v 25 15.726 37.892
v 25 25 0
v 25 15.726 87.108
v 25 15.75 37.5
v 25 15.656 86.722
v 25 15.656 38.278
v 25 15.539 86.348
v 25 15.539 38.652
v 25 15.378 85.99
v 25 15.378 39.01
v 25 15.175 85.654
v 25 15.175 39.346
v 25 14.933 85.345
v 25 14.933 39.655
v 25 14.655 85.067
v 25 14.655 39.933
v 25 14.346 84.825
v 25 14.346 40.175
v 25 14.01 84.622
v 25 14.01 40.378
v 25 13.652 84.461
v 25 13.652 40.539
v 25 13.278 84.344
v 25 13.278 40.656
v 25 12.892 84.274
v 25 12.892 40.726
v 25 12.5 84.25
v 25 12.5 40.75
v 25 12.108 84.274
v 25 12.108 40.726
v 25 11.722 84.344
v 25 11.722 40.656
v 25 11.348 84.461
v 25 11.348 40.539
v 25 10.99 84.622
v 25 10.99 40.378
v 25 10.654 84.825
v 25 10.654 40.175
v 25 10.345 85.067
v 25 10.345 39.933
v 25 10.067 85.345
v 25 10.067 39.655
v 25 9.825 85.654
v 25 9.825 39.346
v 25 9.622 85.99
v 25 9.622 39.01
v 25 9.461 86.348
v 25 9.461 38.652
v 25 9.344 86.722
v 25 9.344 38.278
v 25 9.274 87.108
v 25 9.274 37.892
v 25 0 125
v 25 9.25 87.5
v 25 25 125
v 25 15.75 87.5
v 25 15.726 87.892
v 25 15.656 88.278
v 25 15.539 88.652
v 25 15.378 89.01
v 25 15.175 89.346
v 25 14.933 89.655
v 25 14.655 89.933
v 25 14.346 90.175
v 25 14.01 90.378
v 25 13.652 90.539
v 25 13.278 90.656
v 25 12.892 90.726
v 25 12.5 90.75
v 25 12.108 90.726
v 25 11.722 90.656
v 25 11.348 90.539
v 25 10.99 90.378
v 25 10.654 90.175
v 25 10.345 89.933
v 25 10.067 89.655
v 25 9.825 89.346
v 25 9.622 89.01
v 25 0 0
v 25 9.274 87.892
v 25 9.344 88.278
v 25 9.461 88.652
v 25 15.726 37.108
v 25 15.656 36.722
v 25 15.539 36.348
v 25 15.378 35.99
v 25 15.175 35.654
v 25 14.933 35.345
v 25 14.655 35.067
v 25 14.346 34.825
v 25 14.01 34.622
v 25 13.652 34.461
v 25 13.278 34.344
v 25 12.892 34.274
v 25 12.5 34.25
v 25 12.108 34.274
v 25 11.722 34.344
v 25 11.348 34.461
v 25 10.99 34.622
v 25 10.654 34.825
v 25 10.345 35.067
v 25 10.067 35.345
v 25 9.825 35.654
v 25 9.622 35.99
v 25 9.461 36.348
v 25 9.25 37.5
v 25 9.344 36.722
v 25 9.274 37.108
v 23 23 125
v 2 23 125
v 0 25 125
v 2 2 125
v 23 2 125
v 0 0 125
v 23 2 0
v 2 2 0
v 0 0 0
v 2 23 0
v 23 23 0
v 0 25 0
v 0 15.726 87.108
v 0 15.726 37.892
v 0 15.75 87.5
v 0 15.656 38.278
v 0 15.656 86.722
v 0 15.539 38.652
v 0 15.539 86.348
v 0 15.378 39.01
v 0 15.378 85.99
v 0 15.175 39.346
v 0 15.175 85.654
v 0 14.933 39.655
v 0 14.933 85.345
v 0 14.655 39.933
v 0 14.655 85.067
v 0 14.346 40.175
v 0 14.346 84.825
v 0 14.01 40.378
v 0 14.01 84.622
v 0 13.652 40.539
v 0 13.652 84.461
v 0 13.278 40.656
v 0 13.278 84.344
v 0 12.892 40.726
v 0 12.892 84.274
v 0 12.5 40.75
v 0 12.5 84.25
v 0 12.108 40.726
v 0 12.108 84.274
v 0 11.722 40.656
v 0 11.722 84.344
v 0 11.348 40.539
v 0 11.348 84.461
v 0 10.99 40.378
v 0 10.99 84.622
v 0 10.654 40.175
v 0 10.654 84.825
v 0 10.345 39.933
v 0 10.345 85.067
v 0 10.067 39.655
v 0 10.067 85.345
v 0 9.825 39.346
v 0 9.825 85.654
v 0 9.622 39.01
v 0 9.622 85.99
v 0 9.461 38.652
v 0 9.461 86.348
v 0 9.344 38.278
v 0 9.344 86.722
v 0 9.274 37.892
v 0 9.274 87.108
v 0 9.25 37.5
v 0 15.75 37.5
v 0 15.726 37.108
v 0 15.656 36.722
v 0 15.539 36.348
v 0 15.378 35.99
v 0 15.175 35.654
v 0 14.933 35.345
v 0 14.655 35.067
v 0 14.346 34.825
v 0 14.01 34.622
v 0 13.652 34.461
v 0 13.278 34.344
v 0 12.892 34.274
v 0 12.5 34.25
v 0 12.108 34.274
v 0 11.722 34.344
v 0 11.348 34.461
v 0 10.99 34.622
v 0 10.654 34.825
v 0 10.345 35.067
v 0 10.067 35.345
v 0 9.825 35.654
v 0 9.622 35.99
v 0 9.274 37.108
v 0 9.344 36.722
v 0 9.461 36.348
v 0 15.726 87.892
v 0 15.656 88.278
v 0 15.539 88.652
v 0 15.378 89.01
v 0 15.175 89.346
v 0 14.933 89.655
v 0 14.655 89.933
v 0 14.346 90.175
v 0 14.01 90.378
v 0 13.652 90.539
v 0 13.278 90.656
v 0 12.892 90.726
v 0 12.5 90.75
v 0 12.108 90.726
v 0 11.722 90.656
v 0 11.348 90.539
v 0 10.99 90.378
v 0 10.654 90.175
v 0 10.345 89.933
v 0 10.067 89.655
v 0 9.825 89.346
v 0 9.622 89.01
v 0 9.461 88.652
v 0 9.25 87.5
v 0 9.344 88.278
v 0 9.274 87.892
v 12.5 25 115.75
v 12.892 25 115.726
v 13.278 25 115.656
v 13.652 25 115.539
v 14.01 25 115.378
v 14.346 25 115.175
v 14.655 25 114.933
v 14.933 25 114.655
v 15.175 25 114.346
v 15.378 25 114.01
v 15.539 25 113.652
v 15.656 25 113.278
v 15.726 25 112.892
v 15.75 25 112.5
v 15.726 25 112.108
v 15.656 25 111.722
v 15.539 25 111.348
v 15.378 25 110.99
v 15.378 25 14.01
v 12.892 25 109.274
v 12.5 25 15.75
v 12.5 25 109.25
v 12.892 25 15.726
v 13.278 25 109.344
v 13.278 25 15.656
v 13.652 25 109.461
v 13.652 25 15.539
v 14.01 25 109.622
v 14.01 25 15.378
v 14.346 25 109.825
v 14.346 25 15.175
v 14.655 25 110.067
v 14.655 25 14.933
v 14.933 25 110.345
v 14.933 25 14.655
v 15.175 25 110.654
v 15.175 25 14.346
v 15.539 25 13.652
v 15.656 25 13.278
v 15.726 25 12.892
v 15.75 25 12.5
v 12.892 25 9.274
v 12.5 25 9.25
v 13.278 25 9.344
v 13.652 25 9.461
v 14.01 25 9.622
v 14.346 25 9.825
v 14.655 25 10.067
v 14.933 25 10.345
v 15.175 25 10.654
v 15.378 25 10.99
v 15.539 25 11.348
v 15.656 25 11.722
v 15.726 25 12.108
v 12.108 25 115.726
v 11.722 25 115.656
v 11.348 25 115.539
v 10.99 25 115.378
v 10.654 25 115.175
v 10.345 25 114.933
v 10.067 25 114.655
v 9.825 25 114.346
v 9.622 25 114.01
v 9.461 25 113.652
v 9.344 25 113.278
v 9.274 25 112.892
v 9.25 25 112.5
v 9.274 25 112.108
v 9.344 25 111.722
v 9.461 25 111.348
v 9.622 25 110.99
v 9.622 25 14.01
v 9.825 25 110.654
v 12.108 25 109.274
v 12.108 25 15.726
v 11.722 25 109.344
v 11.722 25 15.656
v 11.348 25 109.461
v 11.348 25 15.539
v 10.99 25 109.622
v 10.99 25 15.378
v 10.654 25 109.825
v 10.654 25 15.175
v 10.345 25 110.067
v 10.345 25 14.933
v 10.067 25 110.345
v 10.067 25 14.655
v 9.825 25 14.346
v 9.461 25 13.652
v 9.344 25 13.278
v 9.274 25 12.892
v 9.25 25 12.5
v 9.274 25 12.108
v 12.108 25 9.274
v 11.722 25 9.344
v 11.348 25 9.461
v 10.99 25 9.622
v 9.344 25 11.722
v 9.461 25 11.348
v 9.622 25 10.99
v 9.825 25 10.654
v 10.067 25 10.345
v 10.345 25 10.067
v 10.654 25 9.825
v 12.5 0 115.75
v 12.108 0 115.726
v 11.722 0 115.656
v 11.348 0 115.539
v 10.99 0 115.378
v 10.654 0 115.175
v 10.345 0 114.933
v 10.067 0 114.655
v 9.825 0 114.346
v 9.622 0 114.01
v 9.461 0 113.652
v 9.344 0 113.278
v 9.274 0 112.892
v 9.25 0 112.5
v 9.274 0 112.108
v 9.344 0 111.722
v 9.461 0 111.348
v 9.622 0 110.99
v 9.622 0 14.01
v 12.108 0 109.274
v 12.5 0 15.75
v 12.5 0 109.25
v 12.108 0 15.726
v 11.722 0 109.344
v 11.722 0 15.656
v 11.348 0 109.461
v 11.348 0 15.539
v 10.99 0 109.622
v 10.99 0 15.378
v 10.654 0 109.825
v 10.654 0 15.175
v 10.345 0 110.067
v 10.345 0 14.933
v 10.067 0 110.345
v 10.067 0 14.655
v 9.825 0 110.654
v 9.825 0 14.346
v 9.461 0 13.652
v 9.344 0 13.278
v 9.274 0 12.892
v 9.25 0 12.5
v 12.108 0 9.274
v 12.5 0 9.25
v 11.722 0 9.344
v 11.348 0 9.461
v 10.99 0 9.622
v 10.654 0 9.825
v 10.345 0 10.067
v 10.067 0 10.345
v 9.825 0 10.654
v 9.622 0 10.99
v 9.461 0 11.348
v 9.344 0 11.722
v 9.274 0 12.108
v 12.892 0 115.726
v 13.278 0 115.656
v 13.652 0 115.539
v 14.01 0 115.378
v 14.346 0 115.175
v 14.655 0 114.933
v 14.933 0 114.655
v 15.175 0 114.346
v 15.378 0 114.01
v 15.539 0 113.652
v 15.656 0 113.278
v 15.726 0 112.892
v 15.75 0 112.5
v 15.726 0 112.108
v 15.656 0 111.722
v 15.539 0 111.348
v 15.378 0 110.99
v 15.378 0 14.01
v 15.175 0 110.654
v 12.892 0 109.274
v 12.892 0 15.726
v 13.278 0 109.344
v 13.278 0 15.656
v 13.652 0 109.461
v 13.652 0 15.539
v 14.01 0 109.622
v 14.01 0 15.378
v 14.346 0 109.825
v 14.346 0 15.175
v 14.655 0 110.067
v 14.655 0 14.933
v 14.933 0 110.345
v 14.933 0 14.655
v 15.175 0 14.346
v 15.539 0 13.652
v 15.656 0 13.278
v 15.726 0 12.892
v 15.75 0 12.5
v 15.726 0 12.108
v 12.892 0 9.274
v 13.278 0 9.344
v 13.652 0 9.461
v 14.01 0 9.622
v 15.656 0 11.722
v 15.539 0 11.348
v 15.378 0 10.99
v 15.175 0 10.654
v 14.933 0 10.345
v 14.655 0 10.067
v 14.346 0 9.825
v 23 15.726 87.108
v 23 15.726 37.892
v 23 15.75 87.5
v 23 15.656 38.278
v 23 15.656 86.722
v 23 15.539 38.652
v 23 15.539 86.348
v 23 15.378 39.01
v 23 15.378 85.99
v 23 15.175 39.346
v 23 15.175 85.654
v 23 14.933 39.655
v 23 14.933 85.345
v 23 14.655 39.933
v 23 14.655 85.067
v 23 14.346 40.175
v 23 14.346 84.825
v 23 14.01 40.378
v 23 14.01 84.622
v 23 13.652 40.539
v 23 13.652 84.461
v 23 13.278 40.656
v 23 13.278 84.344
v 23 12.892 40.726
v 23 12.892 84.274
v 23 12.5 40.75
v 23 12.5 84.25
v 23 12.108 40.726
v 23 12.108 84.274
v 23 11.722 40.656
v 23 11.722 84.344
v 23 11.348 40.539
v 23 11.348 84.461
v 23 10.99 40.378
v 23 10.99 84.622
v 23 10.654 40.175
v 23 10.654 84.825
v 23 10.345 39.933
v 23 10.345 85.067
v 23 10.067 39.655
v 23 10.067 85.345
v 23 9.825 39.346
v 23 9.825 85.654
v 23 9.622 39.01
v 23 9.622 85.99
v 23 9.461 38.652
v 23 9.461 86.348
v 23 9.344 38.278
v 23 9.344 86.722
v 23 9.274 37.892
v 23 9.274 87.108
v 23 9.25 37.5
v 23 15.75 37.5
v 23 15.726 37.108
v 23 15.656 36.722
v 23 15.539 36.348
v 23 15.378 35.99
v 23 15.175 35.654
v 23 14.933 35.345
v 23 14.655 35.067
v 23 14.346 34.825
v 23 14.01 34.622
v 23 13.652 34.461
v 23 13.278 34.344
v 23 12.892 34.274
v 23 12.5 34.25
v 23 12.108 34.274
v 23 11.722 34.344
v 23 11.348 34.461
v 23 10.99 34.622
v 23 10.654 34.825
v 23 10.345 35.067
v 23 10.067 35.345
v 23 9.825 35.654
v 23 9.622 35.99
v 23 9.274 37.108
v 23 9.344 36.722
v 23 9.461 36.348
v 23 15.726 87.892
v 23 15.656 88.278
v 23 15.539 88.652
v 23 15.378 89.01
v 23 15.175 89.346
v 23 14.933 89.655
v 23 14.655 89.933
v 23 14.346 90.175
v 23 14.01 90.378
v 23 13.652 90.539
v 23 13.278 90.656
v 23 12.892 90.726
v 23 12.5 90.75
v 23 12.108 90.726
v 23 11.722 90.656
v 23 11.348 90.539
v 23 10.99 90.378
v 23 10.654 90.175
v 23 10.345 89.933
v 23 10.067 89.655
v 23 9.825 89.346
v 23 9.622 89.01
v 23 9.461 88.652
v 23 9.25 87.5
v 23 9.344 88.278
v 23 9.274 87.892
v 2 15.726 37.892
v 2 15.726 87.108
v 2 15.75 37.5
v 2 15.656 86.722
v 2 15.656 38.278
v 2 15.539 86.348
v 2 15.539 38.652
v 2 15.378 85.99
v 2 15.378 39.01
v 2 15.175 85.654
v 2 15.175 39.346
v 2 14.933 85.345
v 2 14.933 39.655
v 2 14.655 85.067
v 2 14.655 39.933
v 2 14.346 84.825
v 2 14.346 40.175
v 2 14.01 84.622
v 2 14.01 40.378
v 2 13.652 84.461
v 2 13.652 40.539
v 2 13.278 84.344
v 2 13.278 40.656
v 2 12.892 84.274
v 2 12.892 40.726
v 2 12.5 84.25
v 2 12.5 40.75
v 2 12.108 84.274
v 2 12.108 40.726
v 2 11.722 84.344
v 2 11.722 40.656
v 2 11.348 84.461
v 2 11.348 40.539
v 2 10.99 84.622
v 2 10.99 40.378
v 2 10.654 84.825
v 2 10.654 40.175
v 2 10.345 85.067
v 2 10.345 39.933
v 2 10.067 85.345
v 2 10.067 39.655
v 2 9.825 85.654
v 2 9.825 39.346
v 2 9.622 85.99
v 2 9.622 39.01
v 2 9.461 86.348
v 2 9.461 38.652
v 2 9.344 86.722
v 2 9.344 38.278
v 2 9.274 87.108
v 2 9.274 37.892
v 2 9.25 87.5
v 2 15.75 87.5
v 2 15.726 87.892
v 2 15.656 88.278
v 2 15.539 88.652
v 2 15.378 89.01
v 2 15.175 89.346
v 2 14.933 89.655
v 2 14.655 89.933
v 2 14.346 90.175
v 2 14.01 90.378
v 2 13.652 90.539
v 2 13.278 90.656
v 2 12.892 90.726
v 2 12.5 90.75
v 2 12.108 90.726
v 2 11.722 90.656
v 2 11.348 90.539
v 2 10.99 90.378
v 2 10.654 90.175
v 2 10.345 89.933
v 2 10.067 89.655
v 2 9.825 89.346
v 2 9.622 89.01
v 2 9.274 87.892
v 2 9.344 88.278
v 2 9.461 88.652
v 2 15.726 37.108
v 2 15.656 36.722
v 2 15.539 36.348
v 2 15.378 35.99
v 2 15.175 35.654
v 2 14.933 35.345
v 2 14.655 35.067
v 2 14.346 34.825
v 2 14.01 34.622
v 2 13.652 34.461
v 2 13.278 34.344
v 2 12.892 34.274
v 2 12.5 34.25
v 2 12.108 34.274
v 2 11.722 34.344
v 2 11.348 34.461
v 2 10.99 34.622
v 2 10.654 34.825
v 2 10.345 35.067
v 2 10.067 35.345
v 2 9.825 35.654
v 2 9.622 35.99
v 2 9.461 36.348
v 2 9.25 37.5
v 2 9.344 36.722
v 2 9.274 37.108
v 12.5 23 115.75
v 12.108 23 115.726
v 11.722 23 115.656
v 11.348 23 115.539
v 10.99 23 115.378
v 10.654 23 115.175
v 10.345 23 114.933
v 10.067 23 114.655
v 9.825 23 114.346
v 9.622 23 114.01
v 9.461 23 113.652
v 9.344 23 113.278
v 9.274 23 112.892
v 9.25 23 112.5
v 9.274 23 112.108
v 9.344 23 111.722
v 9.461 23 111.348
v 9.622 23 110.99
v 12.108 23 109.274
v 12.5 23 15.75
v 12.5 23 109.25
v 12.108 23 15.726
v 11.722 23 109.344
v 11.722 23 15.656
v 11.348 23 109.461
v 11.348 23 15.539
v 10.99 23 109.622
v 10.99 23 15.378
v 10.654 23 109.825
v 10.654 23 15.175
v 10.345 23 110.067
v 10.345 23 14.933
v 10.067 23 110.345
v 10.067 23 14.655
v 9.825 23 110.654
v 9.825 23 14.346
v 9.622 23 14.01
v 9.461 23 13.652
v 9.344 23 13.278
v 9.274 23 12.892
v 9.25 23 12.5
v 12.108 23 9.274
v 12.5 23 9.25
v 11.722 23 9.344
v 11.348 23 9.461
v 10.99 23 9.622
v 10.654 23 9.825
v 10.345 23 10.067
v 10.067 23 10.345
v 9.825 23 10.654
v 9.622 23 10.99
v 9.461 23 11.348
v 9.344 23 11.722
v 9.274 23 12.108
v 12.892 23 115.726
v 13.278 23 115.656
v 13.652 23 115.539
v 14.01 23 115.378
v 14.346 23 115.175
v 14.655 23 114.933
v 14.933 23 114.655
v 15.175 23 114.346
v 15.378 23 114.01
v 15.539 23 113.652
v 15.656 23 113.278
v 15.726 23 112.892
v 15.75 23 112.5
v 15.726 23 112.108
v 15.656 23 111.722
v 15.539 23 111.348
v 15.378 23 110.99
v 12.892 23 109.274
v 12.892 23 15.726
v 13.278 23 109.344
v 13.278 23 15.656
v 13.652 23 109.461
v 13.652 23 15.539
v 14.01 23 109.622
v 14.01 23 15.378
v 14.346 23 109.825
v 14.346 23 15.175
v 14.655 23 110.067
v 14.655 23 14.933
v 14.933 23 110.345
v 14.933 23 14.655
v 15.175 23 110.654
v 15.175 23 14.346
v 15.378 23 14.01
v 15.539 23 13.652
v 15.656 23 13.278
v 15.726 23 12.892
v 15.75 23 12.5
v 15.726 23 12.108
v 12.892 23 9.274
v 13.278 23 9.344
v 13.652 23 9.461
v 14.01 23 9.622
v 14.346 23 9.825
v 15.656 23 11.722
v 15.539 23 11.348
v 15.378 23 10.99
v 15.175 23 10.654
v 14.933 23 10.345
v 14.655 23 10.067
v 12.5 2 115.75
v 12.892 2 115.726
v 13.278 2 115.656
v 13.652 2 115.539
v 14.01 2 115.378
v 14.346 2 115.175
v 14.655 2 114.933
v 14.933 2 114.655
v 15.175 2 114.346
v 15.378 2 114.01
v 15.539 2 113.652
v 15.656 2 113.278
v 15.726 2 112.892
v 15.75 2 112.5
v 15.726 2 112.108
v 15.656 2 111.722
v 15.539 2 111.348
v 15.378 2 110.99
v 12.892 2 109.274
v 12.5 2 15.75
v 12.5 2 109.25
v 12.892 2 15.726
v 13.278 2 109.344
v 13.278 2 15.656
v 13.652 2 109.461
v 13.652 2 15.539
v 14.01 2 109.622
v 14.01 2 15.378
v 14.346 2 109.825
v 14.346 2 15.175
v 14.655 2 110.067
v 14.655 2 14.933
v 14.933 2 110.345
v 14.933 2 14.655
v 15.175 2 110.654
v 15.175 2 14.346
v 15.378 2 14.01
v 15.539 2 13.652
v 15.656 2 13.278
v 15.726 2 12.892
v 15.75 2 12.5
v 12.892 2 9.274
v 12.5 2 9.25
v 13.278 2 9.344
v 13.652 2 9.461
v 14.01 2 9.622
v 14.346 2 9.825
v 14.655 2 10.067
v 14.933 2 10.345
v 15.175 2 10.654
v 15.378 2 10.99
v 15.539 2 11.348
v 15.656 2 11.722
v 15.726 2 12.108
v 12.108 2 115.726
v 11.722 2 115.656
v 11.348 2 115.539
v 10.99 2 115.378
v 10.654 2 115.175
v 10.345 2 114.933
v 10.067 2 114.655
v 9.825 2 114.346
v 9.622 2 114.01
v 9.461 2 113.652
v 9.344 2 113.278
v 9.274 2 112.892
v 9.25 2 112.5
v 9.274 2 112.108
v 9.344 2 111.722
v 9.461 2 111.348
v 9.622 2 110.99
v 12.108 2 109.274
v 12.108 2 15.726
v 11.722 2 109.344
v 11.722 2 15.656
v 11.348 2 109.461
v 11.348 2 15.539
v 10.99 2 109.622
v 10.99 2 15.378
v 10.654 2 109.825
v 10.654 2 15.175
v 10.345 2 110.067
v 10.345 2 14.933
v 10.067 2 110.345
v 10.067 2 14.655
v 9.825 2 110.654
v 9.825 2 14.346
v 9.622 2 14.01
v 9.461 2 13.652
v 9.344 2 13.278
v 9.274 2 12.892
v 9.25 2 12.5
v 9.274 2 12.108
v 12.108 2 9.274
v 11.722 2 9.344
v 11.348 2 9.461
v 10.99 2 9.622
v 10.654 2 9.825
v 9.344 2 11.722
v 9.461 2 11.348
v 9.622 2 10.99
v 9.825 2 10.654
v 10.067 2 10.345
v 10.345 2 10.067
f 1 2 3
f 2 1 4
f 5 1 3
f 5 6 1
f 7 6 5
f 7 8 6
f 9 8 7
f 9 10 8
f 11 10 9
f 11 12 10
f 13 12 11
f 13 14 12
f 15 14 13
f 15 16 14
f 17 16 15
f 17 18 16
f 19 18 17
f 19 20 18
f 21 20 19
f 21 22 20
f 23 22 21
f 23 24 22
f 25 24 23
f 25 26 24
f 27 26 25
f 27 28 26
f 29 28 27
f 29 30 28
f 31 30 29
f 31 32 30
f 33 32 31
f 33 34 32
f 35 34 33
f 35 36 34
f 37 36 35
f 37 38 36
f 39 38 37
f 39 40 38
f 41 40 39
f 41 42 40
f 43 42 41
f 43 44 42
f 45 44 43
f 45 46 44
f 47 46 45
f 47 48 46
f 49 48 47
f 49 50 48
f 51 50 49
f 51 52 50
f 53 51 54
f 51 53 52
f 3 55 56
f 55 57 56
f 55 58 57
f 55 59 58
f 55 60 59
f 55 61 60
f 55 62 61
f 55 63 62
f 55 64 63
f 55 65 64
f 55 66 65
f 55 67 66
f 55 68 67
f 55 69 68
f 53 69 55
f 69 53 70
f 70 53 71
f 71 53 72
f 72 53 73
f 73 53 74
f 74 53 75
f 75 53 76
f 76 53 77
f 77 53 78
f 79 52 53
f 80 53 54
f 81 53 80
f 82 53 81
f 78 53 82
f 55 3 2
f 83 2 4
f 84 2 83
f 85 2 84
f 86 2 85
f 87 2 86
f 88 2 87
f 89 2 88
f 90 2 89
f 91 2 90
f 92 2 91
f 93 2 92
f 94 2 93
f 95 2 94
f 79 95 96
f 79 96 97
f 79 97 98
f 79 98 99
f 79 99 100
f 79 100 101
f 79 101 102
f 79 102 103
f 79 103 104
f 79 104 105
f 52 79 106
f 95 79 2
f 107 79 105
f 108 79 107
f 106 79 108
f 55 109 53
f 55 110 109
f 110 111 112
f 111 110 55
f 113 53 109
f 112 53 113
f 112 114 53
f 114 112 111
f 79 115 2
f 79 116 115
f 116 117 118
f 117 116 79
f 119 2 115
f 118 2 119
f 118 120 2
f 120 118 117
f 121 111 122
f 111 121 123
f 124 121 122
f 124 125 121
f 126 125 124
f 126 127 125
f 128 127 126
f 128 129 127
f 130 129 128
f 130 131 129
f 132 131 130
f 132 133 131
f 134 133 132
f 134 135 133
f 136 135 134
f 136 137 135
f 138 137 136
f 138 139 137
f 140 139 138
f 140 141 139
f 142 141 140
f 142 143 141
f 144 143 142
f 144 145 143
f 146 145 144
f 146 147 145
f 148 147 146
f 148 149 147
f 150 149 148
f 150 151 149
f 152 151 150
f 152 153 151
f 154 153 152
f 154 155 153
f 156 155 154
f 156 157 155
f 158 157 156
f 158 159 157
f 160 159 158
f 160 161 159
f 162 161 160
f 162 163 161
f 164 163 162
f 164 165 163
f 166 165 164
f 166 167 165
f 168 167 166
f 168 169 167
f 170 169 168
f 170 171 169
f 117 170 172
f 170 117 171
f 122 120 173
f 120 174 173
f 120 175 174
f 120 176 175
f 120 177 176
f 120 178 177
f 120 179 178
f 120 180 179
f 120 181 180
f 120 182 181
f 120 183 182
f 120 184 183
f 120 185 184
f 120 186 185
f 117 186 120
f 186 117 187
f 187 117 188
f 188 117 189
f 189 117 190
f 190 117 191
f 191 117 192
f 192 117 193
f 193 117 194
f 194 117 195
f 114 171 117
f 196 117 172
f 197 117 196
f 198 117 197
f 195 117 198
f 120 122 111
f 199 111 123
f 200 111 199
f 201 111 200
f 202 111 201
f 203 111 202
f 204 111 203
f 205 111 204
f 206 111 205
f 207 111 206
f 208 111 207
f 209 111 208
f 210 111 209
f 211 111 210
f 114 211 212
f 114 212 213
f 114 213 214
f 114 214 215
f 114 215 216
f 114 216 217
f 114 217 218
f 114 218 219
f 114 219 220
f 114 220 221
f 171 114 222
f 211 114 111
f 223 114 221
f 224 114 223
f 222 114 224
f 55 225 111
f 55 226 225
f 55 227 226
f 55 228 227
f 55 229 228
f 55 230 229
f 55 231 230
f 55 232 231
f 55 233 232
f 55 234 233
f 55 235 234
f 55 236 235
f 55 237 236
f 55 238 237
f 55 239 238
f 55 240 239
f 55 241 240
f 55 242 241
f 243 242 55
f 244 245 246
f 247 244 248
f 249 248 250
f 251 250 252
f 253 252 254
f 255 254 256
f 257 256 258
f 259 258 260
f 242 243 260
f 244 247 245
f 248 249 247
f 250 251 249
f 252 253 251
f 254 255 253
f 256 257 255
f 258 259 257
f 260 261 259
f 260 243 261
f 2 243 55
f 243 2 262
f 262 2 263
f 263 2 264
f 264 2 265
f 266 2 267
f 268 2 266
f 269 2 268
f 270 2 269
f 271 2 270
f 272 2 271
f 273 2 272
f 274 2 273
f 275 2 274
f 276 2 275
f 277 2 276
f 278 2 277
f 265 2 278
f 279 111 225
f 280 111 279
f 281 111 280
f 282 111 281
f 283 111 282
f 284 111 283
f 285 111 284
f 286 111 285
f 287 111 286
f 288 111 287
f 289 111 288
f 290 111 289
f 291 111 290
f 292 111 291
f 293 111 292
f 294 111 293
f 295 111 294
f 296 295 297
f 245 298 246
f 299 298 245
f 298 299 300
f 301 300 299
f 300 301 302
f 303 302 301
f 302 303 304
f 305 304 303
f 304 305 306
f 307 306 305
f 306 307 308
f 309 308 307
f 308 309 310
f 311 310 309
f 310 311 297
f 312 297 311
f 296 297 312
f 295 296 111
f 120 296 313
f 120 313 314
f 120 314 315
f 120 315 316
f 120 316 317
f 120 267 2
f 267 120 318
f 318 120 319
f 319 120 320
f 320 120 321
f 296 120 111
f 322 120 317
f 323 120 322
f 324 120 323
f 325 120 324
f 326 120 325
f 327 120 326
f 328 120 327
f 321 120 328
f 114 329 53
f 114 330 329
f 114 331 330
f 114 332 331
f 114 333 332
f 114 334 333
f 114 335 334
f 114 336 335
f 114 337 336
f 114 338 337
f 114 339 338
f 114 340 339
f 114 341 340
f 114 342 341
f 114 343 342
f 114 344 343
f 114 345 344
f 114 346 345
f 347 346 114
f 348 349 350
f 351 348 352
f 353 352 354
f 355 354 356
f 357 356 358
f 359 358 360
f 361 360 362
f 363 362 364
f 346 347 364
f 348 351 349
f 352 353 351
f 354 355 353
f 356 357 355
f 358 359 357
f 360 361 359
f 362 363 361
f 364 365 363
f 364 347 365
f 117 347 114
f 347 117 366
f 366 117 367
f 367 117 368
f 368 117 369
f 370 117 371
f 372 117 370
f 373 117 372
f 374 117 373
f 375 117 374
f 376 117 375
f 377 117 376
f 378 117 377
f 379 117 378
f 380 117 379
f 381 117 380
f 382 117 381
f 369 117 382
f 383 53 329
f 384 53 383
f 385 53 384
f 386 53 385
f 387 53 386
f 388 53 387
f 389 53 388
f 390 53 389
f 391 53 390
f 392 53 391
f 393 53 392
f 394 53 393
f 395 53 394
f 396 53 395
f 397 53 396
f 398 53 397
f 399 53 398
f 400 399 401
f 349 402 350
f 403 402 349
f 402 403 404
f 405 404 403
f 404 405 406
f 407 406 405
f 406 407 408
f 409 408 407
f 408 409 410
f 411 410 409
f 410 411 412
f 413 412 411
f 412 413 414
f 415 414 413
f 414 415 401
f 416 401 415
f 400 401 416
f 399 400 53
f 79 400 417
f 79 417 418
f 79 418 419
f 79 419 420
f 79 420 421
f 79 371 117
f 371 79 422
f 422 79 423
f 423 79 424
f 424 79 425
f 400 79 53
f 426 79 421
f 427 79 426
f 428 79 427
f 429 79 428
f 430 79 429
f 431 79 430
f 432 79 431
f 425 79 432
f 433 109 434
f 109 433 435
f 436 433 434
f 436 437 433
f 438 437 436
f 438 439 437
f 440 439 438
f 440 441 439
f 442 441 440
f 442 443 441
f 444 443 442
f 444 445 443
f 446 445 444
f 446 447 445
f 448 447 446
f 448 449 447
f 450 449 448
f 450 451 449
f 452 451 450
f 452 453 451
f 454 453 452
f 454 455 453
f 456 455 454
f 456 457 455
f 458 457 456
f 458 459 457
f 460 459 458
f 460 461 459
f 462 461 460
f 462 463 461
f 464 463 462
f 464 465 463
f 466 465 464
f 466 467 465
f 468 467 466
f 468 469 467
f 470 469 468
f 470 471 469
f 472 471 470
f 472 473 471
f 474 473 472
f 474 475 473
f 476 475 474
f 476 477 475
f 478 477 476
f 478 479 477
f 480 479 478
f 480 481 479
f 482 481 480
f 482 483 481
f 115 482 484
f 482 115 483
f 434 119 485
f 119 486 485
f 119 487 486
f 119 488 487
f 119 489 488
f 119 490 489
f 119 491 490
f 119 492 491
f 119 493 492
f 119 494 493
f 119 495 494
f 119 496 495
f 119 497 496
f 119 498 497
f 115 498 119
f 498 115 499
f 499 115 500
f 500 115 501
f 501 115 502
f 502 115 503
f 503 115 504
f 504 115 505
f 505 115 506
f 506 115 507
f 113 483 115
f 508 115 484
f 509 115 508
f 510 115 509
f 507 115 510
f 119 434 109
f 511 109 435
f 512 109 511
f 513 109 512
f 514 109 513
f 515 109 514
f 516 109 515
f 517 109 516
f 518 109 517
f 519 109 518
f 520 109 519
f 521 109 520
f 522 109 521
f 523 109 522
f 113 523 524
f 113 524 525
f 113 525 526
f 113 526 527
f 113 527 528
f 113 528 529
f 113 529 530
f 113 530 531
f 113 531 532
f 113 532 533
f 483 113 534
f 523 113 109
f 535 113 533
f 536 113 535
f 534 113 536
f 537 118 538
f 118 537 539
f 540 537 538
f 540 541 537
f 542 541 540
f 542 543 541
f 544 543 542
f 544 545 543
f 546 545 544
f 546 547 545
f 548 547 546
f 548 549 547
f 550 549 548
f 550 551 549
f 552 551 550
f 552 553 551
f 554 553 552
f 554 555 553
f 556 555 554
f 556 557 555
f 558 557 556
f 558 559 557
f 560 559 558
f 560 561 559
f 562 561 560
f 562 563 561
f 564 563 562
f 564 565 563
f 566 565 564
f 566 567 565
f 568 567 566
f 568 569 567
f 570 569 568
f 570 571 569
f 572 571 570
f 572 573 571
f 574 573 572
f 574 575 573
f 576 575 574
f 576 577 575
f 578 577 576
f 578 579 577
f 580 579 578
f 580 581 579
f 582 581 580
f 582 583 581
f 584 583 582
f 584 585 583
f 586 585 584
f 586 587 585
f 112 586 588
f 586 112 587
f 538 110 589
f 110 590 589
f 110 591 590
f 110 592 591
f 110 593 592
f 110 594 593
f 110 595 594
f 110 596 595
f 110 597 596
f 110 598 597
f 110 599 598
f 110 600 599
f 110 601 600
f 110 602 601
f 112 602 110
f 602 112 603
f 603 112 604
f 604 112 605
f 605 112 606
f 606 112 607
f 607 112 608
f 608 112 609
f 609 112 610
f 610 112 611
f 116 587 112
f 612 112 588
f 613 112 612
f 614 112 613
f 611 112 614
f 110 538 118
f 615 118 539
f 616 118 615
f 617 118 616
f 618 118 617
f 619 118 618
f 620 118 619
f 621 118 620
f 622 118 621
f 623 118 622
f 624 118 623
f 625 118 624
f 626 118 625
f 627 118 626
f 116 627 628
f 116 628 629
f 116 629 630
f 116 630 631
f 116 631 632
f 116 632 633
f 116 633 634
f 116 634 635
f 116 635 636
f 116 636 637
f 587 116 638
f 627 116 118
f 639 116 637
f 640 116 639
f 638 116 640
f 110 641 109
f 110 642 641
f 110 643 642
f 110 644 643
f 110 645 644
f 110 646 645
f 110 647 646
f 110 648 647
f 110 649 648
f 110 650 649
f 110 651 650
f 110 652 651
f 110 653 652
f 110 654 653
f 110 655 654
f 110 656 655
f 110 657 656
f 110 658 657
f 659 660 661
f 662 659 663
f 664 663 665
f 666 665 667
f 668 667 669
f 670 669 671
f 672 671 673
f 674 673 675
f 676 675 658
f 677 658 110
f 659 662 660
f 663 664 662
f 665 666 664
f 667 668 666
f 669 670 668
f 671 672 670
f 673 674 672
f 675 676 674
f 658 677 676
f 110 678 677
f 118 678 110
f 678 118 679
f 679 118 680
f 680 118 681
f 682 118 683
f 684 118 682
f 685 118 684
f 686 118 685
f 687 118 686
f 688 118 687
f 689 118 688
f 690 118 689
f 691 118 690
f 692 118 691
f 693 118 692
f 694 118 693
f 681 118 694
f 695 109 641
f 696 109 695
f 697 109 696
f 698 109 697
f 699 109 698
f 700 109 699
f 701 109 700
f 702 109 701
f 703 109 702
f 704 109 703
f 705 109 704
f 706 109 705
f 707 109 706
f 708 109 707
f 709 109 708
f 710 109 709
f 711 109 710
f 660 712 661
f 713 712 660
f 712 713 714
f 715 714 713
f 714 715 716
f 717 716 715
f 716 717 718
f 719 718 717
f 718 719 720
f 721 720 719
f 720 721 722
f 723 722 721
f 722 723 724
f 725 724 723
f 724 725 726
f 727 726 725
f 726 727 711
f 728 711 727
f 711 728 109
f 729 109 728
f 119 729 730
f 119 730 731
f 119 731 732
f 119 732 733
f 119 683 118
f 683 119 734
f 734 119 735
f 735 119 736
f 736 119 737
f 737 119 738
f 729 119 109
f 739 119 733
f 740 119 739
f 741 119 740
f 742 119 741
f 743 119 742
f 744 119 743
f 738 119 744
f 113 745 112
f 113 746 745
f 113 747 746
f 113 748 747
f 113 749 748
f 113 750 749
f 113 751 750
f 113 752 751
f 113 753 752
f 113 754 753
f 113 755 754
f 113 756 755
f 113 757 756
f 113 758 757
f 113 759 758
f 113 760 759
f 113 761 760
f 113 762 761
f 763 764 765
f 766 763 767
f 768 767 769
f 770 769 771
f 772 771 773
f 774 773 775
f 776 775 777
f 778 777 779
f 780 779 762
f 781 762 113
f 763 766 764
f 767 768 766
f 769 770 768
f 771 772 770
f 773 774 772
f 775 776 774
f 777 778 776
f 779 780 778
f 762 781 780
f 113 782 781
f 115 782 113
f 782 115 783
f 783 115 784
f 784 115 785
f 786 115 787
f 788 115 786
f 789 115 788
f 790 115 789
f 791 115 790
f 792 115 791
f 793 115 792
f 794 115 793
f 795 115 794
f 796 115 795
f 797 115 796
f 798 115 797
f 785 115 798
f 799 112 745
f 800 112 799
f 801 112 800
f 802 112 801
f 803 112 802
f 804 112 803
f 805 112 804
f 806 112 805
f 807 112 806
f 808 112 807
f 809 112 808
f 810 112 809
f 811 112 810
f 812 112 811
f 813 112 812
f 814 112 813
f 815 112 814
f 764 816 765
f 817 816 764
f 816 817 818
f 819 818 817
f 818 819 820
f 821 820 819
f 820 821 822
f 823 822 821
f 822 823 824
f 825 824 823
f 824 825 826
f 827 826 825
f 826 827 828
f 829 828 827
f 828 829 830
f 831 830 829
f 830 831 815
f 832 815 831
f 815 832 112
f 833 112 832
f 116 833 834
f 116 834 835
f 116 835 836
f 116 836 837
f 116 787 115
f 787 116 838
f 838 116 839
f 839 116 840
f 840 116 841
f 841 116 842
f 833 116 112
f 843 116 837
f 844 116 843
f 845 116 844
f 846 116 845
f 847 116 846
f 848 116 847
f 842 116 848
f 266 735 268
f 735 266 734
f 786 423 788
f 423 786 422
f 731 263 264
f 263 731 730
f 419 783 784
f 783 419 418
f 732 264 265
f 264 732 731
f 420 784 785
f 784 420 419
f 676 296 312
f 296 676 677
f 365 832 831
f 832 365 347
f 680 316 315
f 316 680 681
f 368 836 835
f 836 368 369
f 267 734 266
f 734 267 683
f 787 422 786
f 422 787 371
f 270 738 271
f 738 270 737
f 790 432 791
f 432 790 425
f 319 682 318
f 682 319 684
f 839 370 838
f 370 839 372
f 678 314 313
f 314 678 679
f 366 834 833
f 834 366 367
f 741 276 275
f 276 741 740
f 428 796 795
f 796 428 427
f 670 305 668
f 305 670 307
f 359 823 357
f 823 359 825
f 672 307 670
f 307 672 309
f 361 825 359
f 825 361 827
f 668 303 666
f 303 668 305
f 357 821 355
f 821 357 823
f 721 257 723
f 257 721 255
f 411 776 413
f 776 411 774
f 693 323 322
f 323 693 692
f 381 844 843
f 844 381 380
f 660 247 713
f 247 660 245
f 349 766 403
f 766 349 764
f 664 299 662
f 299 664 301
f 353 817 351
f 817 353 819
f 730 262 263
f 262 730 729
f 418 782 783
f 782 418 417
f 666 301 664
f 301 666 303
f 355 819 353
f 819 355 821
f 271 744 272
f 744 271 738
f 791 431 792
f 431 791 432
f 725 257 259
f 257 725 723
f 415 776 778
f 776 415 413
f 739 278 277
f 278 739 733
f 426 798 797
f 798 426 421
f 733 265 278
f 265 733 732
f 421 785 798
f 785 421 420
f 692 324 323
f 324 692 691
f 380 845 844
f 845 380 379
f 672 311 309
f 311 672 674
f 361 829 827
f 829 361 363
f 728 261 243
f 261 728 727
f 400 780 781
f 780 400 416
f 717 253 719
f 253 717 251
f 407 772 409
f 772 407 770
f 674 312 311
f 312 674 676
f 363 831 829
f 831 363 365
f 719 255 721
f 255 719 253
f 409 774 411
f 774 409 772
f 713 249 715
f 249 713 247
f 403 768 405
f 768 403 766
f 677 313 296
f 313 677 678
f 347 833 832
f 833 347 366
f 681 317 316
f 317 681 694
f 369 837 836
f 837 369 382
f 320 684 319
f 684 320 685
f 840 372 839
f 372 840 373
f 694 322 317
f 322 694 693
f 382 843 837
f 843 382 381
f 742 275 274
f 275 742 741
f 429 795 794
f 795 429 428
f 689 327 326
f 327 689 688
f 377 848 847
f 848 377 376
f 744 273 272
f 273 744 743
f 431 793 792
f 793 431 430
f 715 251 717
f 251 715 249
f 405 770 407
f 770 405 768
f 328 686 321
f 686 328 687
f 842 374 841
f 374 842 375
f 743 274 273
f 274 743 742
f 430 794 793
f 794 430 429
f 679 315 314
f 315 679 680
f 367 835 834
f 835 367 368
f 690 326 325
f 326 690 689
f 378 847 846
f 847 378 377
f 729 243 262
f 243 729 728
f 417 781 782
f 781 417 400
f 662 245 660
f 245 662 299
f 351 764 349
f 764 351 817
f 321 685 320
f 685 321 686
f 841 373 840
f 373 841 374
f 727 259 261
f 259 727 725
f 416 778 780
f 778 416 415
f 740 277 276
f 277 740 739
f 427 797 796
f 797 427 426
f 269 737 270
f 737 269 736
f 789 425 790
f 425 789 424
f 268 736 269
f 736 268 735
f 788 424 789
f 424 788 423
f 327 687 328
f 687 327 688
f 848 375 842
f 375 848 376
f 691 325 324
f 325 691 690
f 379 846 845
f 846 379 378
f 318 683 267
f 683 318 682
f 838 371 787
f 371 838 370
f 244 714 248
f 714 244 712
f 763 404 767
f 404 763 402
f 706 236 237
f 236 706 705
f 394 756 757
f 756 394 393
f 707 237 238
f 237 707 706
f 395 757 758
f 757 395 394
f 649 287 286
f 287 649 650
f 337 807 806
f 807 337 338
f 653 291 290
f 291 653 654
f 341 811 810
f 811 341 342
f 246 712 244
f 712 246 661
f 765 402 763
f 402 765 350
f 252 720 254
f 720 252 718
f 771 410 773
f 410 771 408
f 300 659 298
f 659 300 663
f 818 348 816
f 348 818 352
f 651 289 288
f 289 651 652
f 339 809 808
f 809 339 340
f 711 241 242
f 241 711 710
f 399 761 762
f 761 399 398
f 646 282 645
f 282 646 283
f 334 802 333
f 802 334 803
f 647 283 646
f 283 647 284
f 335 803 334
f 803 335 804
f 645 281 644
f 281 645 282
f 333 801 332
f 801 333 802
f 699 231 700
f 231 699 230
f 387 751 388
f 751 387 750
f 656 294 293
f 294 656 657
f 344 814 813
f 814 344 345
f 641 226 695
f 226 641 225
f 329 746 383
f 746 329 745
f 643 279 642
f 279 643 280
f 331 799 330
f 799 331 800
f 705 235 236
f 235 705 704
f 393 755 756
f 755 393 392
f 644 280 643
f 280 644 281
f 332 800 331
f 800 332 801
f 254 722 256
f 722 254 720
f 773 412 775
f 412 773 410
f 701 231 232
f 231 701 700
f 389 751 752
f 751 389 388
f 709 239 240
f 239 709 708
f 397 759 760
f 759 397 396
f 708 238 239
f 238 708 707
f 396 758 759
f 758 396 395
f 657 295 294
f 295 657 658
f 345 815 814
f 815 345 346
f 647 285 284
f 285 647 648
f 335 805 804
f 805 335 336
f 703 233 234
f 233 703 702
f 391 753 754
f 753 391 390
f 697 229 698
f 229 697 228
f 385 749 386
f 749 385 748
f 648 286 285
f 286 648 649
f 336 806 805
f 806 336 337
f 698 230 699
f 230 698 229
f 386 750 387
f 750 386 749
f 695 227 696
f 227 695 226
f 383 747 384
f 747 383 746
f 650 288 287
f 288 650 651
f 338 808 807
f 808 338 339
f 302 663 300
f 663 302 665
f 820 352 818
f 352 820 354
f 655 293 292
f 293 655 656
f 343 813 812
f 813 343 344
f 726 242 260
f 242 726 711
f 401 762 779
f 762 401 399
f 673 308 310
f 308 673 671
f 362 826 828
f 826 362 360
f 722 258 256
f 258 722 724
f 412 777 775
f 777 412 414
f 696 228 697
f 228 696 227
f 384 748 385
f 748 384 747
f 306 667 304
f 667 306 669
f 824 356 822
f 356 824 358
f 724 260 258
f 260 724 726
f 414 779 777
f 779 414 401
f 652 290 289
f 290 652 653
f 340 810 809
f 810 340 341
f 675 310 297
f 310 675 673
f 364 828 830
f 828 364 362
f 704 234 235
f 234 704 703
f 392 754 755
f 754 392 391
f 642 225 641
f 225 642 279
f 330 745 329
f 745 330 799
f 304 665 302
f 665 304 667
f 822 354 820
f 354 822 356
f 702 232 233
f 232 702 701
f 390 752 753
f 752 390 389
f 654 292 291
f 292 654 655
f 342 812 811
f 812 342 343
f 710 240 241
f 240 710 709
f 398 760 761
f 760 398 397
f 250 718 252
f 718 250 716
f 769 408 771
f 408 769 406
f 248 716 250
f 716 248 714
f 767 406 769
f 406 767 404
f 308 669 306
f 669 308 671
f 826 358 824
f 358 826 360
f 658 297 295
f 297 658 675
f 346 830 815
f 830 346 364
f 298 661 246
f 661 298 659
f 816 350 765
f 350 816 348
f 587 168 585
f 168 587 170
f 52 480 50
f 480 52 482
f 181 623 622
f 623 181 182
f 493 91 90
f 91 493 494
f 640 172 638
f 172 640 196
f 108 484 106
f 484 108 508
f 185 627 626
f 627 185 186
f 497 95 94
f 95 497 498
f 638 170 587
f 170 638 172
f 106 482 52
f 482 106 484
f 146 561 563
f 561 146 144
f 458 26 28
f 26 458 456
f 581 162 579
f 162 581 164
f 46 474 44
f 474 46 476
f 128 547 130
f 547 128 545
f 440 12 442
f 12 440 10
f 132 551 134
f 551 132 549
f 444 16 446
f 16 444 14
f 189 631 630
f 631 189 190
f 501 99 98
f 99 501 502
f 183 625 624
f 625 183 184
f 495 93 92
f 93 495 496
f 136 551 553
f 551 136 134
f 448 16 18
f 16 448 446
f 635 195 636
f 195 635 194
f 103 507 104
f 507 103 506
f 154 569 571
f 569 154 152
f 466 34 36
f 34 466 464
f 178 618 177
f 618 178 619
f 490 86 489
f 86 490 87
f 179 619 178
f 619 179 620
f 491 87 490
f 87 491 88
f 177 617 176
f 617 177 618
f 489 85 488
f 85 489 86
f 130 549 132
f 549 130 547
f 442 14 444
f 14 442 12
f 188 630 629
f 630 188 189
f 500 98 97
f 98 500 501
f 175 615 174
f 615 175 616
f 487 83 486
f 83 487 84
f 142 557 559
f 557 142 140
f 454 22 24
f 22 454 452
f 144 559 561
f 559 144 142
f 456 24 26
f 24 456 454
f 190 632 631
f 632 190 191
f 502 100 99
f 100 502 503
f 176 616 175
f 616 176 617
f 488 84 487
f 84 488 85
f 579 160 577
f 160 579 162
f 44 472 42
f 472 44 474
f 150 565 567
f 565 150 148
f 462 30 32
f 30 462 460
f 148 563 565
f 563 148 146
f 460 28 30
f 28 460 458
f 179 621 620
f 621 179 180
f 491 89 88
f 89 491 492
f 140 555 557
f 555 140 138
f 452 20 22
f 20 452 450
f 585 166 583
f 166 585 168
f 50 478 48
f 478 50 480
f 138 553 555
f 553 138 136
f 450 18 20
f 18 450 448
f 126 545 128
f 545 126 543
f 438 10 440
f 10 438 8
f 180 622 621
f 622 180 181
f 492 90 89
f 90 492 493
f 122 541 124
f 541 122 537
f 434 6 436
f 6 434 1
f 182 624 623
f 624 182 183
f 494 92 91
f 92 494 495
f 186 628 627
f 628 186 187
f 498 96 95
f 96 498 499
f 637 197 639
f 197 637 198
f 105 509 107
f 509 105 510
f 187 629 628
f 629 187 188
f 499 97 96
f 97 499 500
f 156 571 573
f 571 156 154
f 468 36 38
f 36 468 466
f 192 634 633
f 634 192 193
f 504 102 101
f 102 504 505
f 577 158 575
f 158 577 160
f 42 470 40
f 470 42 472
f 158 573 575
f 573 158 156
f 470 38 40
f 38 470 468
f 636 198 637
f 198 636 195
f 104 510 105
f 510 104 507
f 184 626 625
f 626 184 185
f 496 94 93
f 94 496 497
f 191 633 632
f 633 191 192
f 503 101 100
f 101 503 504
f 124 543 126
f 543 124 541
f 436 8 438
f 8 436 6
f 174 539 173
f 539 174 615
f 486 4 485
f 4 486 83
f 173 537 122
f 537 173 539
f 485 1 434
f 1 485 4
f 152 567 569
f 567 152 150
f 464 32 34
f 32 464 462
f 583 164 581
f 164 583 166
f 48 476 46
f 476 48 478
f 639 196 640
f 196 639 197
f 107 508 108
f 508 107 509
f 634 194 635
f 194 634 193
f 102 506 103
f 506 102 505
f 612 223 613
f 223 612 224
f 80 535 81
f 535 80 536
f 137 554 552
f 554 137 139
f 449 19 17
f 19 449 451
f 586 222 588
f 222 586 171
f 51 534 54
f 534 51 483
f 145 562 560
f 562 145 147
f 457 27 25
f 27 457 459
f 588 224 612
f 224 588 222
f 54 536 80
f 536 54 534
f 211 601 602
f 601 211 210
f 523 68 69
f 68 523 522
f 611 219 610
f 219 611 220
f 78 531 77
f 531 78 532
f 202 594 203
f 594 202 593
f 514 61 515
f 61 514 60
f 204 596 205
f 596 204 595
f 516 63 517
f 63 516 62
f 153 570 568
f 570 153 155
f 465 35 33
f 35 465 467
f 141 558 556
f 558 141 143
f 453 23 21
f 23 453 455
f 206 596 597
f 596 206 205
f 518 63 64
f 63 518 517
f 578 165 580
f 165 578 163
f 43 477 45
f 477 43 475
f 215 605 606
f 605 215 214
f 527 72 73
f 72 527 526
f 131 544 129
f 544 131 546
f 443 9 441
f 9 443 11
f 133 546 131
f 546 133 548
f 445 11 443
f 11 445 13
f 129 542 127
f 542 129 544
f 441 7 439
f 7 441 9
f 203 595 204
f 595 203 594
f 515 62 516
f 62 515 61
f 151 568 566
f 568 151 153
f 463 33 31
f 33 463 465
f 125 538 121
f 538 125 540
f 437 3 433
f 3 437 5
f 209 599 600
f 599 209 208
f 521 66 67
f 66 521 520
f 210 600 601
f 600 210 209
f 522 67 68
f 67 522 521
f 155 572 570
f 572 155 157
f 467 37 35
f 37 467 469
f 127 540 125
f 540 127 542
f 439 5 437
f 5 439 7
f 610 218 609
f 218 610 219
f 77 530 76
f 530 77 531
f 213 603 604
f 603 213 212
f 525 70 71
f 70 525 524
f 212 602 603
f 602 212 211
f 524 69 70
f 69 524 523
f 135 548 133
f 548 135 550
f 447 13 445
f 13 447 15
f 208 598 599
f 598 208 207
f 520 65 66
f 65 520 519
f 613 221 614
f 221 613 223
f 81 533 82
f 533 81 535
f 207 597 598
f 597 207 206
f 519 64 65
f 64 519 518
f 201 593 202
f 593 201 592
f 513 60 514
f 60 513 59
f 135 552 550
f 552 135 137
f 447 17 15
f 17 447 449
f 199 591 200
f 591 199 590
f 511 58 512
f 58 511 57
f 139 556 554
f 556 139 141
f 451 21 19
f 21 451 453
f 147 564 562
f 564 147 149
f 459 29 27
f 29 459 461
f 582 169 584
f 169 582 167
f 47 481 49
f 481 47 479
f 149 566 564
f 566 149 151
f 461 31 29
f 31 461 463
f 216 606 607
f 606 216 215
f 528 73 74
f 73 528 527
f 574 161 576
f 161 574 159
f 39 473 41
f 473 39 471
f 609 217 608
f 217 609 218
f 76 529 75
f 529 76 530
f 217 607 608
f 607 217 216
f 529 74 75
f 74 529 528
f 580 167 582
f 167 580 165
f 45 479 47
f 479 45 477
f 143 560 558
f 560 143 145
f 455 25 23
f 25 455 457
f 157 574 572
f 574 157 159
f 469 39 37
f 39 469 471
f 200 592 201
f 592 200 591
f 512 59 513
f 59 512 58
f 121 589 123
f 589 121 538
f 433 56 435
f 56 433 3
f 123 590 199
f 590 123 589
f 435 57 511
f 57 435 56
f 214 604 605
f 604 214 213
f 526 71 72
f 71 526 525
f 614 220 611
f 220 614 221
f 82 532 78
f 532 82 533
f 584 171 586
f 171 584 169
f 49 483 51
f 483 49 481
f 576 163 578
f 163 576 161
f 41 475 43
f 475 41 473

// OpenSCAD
annotate=true;
$fa = 1;
$fs = 0.4;
// Building blocks
module rod_25(length, color="lightblue"){
    color(color){
        difference() {
            cube([ 25, 25, length ]);
            translate([ 2, 2, -1 ])
                cube([ 21, 21, length + 2 ]);
        }
    }

    if (annotate){
        color("black"){
            translate([28, 0, 0]){
                rotate([90,0,0]){
                    square([1,length]);
                    translate([2,length/2,0])
                        text(str(length), size=6);    
                }
            
                translate([0, 28, 0]){
                    rotate([90,0,90]){
                        square([1,length]);
                        translate([2,length/2,0])
                            text(str(length), size=6);    
                    }
                }
            }
        }
    }
}

module hole25(front, diameter, x, z) {
    rot_x = (front) ? 90 : 0;
    rot_y = (front) ? 0 : -90;
    trans_x = (front) ? x : z;
    trans_y = (front) ? z : x;
    trans_z = -26;
    color("black")
        rotate([ rot_x, rot_y, 0 ])
            translate([ trans_x, trans_y, trans_z ])
                cylinder(27, diameter / 2, diameter / 2);
    
    
    if (annotate){
        text("hello");
    }
}

// Components
module fr_1a() {
    length = 1500;
    difference() {
        color("lightgreen")
            rod_25(length);
        hole25(true, 6.5, 12.5, length - 12.5);
        hole25(true, 6.5, 12.5, length - 47.5);
        hole25(true, 6.5, 12.5, length - 411.5);
        hole25(false, 6.5, 12.5, length - 436.5);
        hole25(false, 6.5, 12.5, length - 577.5);
        hole25(true, 6.5, 12.5, 635);
        hole25(false, 6.5, 12.5, 610);
        hole25(true, 6.5, 12.5, 585);
        hole25(true, 6.5, 12.5, 97.5);
        hole25(true, 6.5, 12.5, 62.5);
        hole25(true, 6.5, 12.5, 37.5);
        hole25(false, 6.5, 12.5, 12.5);
    }
}

module fr_1b() {
    fr_1a();
}

module fr_2a() {
    length = 210;
    difference() {
        color("red")
            rod_25(length);
        hole25(true, 6.5, 12.5, 12.5);
        hole25(true, 6.5, 12.5, length - 12.5);
        hole25(false, 6.5, 12.5, 37.5);
        hole25(false, 6.5, 12.5, length - 37.5);
    }
}

module fr_2b() {
    length = 260;
    difference() {
        color("yellow")
            rod_25(length);
        hole25(true, 6.5, 12.5, 37.5);
        hole25(true, 6.5, 12.5, 95.5);
        hole25(true, 6.5, 12.5, 179);
        hole25(true, 6.5, 12.5, length - 37.5);
        hole25(false, 6.5, 12.5, 12.5);
        hole25(false, 6.5, 12.5, length - 12.5);
    }
}

module fr_2c() {
    length = 210;
    difference() {
        color("orange") 
            rod_25(length);
        hole25(true, 6.5, 12.5, 12.5);
        hole25(true, 6.5, 12.5, length - 12.5);
        hole25(false, 6.5, 12.5, 37.5);
        hole25(false, 6.5, 12.5, 105.5);
    }
}

module fr_3a() {
    length = 125;
    difference() {
        rod_25(length);
        hole25(true, 6.5, 12.5, 12.5);
        hole25(true, 6.5, 12.5, length - 12.5);
        hole25(false, 6.5, 12.5, 37.5);
        hole25(false, 6.5, 12.5, length - 37.5);
    }
}

module fr_3b() {
    length = 125;
    difference() {
        color("turquoise")
            rod_25(length);
        hole25(true, 6.5, 12.5, 12.5);
        hole25(true, 6.5, 12.5, length - 12.5);
    }
}

// Parts
module frame() {
    rotate([ 0, -90, 0 ]) {
        fr_1b();
        translate([ 0, 100, 0 ])
            fr_1b();
        translate([ 185, 0, 0 ]) {
            fr_1a();
            translate([ 0, 100, 0 ])
                fr_1a();
        }
    }
    translate([ -1500 + 35, 0, 0 ]) {
        translate([ 0, -25, 0 ])
            fr_2a();
        translate([ 0, 125, 0 ])
            fr_2a();
    }
    translate([ -1500 + 411 - 12.5, 0, -25 ]) {
        translate([ 0, 25, 0 ])
            fr_2b();
        translate([ 0, 75, 0 ])
            fr_2b();
    }
    translate([ -50, 25, 0 ])
        fr_2a();
    translate([ -50, 75, 0 ])
        fr_2a();
    translate([ -635 - 12.5, 0, 0 ]) {
        translate([ 0, -25, 0 ])
            fr_2c();
        translate([ 0, 125, 0 ])
            fr_2c();
    }
    translate([ -585 - 12.5, 0, 0 ]) {
        translate([ 0, -25, 0 ])
            fr_2c();
        translate([ 0, 125, 0 ])
            fr_2c();
    }
    rotate([ -90, 0, 0 ]) {
        translate([ -1500 + 423.5, 0, 0 ]) {
            translate([ 0, -235, 0 ])
                fr_3a();
            fr_3a();
        }
        translate([ -25, -50, 0 ])
            fr_3a();
        translate([ -25, -185, 0 ])
            fr_3a();
        translate([ -1500 + 565, -50, 0 ])
            fr_3b();    
    }
}

// frame();
        
fr_3a();
